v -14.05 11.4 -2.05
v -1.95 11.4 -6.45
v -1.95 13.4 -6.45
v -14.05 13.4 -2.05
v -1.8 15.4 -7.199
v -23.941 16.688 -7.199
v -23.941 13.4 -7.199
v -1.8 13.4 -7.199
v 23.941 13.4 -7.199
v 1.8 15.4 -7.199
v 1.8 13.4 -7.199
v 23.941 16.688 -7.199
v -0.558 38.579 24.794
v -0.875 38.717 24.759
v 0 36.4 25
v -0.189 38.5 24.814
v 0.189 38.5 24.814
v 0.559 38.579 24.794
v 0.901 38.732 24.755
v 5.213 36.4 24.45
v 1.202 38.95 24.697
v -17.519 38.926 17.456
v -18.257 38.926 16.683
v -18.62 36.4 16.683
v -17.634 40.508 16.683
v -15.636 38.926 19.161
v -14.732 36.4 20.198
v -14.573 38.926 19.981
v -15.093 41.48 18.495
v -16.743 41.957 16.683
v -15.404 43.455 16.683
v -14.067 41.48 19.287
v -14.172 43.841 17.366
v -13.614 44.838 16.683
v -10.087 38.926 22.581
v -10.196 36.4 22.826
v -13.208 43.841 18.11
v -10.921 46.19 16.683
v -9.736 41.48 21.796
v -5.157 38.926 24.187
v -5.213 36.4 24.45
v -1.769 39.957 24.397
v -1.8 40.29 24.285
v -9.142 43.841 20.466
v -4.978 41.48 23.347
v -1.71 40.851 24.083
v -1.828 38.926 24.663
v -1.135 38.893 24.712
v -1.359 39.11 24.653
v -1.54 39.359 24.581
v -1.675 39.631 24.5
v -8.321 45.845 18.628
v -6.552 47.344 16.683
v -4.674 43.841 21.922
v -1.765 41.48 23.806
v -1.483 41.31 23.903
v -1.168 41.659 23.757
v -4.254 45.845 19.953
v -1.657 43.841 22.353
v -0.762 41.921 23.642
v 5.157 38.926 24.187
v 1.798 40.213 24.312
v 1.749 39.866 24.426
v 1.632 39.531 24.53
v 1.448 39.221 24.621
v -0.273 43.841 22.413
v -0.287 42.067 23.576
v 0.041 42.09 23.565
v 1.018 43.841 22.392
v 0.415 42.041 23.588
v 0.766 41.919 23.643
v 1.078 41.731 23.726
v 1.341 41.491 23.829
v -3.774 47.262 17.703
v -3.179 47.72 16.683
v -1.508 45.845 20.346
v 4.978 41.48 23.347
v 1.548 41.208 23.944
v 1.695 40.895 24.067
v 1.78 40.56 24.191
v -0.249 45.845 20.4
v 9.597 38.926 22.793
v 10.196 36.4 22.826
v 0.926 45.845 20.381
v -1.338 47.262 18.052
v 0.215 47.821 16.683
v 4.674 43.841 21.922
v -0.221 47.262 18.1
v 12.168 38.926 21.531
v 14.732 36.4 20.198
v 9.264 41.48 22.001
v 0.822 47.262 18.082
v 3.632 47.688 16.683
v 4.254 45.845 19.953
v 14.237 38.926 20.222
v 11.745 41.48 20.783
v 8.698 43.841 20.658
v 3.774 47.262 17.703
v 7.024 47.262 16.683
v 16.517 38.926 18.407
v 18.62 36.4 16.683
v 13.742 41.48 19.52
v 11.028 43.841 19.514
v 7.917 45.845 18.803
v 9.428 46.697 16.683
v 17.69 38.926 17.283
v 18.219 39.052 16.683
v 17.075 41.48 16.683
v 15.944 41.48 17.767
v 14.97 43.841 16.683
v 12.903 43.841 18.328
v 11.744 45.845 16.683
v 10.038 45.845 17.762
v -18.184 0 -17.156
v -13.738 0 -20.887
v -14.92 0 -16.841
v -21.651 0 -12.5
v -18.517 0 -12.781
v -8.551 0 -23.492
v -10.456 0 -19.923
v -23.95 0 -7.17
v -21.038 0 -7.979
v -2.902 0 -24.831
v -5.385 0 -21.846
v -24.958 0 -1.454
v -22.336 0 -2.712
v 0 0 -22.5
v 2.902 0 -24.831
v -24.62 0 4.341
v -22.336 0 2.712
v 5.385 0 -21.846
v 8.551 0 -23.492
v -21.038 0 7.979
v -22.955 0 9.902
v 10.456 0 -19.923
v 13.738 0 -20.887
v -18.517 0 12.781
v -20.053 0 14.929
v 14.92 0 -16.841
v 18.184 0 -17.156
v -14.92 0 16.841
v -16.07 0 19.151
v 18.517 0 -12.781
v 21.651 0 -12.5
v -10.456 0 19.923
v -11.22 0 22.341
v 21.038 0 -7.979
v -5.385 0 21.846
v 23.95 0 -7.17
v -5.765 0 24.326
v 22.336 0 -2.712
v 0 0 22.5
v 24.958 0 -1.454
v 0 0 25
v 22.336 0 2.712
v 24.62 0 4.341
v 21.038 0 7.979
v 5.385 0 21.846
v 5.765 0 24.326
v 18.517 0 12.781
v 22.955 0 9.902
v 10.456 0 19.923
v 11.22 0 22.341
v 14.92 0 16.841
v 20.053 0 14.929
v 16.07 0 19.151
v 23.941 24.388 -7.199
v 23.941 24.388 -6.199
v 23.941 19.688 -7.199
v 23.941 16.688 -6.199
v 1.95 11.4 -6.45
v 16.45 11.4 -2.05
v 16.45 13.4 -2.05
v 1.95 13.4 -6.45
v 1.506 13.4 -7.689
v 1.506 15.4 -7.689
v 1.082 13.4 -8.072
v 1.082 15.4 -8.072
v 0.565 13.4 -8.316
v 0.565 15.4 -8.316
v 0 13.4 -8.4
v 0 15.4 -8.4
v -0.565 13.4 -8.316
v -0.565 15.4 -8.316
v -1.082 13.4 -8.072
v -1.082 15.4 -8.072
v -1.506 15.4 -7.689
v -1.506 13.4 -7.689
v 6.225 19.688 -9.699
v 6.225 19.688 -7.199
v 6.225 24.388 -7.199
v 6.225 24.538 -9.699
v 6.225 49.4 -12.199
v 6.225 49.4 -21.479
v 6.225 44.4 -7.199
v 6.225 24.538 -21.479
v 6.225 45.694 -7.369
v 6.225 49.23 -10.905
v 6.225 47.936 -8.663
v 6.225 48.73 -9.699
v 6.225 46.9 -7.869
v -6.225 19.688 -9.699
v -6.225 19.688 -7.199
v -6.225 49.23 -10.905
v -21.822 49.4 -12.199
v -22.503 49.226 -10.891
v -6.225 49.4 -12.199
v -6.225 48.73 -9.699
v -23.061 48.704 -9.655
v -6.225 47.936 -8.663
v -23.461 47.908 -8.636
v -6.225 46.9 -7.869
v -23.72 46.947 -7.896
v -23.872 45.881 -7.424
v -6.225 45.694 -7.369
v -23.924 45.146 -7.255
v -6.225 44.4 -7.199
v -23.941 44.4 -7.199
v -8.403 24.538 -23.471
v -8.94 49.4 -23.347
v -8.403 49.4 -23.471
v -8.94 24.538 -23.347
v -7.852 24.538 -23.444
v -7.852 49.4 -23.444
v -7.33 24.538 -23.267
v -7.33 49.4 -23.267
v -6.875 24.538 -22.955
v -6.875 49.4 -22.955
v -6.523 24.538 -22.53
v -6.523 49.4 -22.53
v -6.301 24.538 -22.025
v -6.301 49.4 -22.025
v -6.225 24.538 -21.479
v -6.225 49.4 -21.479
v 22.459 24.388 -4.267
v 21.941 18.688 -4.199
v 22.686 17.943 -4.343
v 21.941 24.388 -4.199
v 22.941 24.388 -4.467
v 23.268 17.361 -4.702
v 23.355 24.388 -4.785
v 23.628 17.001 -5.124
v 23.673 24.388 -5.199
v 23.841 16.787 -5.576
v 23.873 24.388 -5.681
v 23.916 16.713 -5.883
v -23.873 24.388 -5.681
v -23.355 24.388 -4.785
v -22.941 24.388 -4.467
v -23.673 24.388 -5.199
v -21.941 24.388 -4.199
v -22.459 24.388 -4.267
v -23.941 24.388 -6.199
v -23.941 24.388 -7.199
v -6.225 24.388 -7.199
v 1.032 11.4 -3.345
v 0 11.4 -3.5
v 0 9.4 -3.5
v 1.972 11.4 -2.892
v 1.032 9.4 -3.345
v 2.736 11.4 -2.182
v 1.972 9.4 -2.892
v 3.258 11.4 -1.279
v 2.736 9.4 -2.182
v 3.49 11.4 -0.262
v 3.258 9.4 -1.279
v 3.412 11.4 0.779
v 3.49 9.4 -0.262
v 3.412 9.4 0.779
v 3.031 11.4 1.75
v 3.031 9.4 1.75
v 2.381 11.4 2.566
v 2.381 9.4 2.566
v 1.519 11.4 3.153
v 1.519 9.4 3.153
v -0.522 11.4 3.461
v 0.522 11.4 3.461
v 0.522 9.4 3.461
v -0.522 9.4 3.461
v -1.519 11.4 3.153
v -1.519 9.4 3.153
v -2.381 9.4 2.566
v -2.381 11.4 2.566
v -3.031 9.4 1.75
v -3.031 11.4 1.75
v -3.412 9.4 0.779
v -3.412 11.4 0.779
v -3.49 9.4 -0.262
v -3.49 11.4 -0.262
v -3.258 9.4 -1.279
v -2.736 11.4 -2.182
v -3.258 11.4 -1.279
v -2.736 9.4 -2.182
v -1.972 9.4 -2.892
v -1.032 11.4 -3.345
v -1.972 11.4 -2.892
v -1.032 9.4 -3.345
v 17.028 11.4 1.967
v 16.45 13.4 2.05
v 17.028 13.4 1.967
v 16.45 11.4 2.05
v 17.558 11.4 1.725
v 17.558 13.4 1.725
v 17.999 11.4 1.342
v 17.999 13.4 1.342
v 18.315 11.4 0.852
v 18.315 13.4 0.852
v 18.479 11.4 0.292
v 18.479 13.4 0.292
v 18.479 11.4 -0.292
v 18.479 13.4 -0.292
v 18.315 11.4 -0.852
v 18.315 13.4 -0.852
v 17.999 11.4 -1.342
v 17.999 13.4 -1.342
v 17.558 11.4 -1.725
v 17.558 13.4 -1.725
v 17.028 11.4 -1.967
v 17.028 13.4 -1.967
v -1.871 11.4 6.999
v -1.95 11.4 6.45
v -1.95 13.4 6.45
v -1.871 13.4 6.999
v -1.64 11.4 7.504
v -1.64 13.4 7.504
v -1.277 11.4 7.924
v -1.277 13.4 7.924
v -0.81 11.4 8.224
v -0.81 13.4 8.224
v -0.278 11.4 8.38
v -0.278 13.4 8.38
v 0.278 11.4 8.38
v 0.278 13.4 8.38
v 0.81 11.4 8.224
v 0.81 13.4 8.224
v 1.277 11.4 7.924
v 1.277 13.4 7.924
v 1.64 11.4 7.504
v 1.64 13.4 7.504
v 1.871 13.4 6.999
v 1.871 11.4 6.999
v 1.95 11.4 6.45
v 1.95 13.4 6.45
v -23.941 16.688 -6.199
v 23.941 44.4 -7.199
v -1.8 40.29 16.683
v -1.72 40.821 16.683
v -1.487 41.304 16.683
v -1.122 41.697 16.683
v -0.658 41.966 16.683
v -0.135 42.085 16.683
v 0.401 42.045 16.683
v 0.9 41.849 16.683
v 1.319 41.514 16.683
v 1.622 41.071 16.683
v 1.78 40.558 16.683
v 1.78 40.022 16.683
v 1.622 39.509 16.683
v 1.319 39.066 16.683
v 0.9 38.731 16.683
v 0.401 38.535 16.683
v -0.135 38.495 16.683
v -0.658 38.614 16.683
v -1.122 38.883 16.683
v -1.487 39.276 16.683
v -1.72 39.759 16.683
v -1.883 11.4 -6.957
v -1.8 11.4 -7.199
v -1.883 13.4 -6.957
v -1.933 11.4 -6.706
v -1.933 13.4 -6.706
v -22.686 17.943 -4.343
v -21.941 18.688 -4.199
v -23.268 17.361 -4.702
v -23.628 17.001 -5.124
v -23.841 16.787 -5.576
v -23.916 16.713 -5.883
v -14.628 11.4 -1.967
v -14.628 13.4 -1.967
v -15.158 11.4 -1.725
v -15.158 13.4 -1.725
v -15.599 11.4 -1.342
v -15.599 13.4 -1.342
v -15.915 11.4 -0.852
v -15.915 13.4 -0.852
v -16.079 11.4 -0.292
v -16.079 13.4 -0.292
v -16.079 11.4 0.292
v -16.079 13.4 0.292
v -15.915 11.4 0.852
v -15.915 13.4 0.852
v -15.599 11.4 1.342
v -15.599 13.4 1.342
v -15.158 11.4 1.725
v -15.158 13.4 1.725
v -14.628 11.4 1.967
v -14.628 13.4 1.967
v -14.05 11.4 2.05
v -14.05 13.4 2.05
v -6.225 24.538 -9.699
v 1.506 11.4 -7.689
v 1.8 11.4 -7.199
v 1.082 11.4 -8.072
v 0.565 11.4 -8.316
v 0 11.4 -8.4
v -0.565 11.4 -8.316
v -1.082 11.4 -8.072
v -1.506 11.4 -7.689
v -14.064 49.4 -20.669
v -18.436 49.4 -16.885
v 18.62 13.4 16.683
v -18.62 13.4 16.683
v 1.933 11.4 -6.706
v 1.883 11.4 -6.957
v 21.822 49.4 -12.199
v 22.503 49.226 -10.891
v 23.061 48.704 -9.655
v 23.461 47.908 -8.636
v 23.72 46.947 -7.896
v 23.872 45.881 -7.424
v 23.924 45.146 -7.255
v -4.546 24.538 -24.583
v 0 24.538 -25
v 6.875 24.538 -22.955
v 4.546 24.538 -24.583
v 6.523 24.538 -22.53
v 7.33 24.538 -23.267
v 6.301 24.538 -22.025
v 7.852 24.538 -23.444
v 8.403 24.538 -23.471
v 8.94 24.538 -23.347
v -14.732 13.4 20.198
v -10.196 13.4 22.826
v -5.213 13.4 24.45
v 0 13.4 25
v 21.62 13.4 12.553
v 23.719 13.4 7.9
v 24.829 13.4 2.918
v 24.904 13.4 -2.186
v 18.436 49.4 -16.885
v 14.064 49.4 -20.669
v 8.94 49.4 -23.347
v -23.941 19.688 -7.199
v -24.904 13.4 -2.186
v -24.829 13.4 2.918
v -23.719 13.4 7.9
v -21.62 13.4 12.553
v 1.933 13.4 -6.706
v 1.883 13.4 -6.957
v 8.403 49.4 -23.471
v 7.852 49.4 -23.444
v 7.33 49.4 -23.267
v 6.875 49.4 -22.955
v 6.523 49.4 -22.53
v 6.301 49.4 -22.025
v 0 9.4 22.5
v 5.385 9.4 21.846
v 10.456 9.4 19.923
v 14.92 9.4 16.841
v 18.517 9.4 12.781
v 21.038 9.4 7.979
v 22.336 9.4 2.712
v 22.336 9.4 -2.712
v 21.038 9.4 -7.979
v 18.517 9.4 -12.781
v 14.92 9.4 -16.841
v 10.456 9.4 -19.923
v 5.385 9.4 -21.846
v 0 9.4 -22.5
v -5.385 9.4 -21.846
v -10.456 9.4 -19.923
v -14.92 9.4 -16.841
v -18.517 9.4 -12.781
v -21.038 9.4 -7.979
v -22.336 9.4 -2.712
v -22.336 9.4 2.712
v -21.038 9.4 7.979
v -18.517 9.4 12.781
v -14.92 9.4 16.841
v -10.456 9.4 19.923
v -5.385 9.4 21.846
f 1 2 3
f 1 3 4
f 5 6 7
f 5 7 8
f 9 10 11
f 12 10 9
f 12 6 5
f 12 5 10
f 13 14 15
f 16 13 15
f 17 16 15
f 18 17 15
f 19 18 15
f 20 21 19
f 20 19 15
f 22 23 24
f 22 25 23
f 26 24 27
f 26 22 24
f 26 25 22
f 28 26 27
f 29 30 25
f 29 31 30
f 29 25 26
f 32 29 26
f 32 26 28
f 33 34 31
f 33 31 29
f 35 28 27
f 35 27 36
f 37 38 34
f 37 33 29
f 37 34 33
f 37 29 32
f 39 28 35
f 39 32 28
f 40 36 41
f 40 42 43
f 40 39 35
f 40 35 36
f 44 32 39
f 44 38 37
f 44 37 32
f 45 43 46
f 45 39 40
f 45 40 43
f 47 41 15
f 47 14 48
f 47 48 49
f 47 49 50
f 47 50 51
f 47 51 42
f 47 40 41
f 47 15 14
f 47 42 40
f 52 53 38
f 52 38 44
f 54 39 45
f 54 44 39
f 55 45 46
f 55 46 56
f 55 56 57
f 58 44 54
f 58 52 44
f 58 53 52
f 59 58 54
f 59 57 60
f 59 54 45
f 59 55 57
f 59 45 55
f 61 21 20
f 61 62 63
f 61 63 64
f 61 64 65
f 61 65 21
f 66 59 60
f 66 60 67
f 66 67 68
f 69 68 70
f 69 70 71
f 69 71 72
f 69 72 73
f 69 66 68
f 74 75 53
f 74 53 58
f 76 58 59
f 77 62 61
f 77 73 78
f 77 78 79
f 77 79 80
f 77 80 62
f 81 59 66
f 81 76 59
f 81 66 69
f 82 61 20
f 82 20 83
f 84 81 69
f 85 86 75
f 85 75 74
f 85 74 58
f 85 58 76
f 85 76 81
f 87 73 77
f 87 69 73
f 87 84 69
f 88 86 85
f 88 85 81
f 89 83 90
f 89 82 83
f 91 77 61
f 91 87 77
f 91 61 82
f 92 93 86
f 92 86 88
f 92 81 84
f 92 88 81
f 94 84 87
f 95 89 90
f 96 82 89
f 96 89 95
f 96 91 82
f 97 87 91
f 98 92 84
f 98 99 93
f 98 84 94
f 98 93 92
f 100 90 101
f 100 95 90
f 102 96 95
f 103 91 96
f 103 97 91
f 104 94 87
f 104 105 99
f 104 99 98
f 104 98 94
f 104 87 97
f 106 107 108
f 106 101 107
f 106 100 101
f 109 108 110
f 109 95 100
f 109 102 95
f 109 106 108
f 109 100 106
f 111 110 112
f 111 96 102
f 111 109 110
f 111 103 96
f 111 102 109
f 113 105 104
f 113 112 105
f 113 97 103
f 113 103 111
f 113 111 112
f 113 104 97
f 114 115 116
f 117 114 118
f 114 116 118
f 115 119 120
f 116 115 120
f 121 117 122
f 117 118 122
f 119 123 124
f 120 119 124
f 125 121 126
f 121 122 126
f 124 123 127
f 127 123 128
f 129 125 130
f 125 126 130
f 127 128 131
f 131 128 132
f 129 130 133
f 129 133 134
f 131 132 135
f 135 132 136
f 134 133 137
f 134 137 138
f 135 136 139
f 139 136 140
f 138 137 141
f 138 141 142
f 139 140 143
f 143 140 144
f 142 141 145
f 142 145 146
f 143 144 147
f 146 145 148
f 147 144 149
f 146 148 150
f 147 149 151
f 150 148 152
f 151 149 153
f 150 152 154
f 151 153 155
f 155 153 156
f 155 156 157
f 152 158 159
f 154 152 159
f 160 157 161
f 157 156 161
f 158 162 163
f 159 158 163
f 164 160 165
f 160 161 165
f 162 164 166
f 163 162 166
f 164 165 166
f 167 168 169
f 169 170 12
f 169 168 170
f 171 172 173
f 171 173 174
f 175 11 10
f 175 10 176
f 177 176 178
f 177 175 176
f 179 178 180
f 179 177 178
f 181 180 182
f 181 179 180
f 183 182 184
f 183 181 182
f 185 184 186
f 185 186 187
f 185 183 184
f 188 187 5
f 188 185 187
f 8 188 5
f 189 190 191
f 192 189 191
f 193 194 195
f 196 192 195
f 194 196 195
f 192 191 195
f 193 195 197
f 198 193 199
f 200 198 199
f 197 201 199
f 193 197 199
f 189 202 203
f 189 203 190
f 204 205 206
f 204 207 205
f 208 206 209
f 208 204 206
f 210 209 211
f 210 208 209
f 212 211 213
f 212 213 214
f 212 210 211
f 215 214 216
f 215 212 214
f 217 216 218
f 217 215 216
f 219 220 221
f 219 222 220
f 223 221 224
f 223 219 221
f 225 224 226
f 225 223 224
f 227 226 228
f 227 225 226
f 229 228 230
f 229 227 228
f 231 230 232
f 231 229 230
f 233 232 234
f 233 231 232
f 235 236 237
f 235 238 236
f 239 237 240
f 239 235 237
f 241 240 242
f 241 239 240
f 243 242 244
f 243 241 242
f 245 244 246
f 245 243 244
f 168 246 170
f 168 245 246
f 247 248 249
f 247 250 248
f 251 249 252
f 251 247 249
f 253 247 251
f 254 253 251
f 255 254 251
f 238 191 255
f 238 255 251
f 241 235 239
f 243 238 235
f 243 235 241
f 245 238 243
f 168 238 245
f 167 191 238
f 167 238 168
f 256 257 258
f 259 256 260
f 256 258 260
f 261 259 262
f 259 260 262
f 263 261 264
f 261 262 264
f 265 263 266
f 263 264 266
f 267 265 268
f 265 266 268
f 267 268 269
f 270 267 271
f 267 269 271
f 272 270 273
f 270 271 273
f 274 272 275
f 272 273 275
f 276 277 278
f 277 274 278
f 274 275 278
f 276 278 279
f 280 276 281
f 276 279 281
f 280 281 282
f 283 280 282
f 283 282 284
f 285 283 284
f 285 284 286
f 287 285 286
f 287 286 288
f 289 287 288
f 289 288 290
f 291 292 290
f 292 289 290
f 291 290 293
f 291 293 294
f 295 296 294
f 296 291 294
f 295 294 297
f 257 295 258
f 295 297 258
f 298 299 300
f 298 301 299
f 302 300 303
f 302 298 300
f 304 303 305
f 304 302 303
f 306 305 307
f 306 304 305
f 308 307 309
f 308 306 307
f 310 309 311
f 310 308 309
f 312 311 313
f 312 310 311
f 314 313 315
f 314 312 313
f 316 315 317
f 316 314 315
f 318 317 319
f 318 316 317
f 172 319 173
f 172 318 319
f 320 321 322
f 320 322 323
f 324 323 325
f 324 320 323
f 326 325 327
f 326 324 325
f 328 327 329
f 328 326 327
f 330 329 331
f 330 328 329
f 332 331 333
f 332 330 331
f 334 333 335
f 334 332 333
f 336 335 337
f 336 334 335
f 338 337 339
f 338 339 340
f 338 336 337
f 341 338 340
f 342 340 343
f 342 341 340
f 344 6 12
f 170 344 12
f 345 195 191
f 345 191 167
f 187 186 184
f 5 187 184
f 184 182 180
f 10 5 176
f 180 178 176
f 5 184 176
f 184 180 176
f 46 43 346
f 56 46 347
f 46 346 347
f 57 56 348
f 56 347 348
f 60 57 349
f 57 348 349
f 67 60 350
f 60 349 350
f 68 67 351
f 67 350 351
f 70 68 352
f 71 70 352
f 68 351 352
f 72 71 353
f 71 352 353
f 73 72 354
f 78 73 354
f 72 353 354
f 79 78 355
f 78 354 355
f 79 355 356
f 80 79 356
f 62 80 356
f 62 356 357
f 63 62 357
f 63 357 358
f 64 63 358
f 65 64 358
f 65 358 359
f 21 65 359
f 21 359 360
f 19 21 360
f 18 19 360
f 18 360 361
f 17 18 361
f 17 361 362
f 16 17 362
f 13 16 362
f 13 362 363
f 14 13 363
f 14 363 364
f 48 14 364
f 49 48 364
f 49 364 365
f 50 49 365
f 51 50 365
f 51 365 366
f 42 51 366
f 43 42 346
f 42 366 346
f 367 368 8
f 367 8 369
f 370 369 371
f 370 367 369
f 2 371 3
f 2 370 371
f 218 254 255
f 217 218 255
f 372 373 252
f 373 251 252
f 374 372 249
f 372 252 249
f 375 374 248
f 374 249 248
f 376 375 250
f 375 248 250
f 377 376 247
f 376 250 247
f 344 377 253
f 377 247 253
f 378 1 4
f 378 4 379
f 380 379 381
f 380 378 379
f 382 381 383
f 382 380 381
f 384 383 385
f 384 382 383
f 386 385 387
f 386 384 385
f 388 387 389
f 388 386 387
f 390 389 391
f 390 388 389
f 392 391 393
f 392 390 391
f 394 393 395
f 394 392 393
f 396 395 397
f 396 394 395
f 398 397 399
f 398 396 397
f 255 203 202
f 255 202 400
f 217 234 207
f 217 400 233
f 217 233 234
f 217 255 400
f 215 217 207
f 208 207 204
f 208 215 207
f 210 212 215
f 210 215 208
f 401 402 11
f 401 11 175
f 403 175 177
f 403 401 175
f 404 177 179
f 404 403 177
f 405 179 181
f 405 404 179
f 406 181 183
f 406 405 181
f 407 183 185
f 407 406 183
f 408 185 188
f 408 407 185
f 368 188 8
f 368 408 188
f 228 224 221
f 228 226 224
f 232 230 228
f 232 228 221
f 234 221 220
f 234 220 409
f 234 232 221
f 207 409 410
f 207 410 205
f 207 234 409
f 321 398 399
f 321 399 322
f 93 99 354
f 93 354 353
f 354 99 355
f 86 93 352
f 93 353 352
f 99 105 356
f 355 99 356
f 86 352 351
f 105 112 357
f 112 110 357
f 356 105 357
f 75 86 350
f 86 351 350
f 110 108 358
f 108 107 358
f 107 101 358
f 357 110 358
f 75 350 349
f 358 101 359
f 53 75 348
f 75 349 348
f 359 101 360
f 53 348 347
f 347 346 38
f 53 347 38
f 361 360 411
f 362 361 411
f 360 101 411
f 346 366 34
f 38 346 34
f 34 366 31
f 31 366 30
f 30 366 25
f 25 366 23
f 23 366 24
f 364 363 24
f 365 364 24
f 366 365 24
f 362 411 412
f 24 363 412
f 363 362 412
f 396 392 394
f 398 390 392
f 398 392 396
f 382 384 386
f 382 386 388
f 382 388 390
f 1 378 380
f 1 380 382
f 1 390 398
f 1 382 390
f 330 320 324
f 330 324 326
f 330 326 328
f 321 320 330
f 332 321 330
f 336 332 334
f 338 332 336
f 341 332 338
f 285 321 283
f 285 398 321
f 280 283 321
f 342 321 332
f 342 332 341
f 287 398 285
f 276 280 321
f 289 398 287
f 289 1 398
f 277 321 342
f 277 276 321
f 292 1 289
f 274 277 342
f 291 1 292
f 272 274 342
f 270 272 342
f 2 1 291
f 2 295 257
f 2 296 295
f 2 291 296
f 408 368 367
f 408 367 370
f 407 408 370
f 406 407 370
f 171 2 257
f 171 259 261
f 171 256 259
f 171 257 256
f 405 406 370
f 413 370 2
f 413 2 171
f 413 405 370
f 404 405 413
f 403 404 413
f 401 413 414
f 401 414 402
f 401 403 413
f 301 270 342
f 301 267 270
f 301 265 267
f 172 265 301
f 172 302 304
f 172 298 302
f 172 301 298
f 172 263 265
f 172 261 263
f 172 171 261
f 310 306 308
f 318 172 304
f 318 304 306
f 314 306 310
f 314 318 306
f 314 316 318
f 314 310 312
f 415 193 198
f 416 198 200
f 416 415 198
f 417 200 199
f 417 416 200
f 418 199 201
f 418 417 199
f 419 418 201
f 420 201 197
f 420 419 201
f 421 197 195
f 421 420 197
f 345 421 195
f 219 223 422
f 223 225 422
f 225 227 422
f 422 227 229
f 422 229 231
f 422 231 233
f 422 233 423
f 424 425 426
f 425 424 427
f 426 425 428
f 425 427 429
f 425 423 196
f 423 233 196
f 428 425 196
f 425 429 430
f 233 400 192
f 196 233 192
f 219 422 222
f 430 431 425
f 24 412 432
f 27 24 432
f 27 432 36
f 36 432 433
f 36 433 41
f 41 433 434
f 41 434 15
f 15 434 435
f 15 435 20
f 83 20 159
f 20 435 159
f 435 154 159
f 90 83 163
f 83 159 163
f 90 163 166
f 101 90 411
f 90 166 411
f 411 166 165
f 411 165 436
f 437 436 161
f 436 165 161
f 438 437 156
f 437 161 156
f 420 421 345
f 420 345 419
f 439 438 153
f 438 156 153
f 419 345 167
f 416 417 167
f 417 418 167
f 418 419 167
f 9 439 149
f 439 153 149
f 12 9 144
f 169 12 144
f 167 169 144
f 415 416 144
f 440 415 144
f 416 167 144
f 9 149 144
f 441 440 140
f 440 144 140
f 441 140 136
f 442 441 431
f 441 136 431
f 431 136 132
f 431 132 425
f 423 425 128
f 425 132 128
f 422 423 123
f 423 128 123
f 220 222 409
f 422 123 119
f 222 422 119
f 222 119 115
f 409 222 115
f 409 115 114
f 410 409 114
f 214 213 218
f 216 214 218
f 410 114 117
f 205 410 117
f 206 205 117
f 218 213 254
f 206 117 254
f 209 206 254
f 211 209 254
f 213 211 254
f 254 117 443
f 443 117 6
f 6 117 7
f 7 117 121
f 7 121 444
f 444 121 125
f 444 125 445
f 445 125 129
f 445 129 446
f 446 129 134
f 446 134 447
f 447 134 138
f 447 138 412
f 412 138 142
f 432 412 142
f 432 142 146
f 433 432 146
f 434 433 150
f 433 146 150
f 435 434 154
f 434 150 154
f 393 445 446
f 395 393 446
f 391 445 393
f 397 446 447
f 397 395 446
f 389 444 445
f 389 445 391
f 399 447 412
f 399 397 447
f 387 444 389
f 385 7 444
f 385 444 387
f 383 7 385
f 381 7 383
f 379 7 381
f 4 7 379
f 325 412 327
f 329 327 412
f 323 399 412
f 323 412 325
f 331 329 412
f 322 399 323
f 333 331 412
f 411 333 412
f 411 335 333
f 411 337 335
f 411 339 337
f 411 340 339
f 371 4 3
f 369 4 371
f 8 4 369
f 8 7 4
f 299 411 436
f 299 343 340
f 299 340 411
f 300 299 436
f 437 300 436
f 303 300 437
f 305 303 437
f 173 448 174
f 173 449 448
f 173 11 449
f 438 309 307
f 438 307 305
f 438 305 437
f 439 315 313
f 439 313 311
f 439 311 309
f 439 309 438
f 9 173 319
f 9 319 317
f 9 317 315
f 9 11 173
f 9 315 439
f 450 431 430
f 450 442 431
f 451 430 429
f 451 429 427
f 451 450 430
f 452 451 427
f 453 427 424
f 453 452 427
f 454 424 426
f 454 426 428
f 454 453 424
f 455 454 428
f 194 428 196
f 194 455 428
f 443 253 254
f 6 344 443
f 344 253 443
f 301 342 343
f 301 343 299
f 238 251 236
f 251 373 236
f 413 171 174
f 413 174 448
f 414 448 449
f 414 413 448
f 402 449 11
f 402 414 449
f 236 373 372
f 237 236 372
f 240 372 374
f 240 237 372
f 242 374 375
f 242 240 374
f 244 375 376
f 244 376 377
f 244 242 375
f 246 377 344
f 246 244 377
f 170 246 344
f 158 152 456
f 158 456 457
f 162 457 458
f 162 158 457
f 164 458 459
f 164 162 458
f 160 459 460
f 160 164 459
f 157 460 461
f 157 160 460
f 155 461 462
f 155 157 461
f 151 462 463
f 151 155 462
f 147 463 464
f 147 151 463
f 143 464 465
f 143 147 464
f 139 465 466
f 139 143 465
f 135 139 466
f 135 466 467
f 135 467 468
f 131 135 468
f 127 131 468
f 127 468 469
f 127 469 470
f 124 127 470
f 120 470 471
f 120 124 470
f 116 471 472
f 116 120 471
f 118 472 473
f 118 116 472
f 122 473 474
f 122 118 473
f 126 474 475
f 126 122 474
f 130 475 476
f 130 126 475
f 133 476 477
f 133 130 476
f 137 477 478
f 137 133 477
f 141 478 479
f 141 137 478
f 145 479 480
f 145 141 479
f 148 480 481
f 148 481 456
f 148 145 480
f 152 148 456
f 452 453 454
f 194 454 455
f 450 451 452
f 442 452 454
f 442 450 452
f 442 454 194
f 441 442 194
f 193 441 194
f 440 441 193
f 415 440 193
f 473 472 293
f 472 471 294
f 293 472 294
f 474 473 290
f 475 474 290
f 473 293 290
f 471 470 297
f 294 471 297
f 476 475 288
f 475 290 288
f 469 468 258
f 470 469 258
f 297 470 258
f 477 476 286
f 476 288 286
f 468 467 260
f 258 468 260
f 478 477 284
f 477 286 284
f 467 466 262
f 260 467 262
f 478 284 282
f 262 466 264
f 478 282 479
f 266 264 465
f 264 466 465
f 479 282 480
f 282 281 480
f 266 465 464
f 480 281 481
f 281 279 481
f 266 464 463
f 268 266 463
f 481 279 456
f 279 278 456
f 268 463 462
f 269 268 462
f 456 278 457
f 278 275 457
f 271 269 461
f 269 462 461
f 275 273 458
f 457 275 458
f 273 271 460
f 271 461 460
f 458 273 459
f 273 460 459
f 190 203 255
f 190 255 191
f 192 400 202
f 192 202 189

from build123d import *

# Parameters (mm, degrees)
SKETCH1_R           = 25
SKETCH1_R_2         = 22.5
BOSS_EXTRUDE1_DEPTH = 9.4
SKETCH2_R           = 25
BOSS_EXTRUDE2_DEPTH = 40
SKETCH3_W           = 55.38055132
SKETCH3_H           = 33.998264421
CUT_EXTRUDE1_DEPTH  = 36
SKETCH4_R           = 3.5
CUT_EXTRUDE2_DEPTH  = 36
CUT_EXTRUDE3_START  = -2
SKETCH5_R           = 3.5
SKETCH5_R_2         = 2.05
SKETCH5_R_3         = 1.95
CUT_EXTRUDE3_DEPTH  = 2
SKETCH5_3_R         = 1.95
CUT_EXTRUDE4_DEPTH  = 2
SKETCH6_W           = 12.45
SKETCH6_H           = 22.55
CUT_EXTRUDE5_DEPTH  = 42
SKETCH6_4_W         = 12.45
SKETCH6_4_H         = 4.85
CUT_EXTRUDE6_DEPTH  = 2.5
SKETCH6_5_W         = 12.45
SKETCH6_5_H         = 2.312362619
CUT_EXTRUDE7_DEPTH  = 28.5
SKETCH7_W           = 47.88210926
SKETCH7_H           = 3
BOSS_EXTRUDE3_DEPTH = 3
SKETCH8_W           = 47.88210926
SKETCH8_H           = 3
BOSS_EXTRUDE4_DEPTH = 4.7
FILLET1_R           = 5
FILLET2_R           = 2
FILLET3_R           = 2
BOSS_EXTRUDE5_DEPTH = 35
FILLET4_R           = 12
SKETCH10_R          = 1.8
CUT_EXTRUDE8_DEPTH  = 36


with BuildPart() as part:
    # Sketch1 → Boss-Extrude1 (new body)
    with BuildSketch(Plane(origin=(0, 0, 0), x_dir=(1, 0, 0), z_dir=(0, 1, 0))):
        with Locations(Location((0, 0, 0), (0, 0, 270))):
            Circle(SKETCH1_R)
        with Locations(Location((0, 0, 0), (0, 0, 270))):
            Circle(SKETCH1_R_2, mode=Mode.SUBTRACT)
    extrude(amount=BOSS_EXTRUDE1_DEPTH)

    # Sketch2 → Boss-Extrude2 (add)
    with BuildSketch(Plane(origin=(0, 9.4, 0), x_dir=(1, 0, 0), z_dir=(0, 1, 0))):
        with Locations(Location((0, 0, 0), (0, 0, 270))):
            Circle(SKETCH2_R)
    extrude(amount=BOSS_EXTRUDE2_DEPTH)

    # Sketch3 → Cut-Extrude1 (cut)
    with BuildSketch(Plane(origin=(0, 49.4, 0), x_dir=(1, 0, 0), z_dir=(0, 1, 0))):
        with Locations((-2.69027566, -9.800111221)):
            Rectangle(SKETCH3_W, SKETCH3_H)
    extrude(amount=-CUT_EXTRUDE1_DEPTH, mode=Mode.SUBTRACT)

    # Sketch4 → Cut-Extrude2 (cut)
    with BuildSketch(Plane.XZ.offset(-9.4)):
        with Locations(Location((0, 0, 0), (0, 0, 270))):
            Circle(SKETCH4_R)
    extrude(amount=-CUT_EXTRUDE2_DEPTH, mode=Mode.SUBTRACT)

    # Sketch5 → Cut-Extrude3 (cut)
    # profile 1 of 6: a face of its own
    with BuildSketch(Plane(origin=(0, 13.4, 0), x_dir=(1, 0, 0), z_dir=(0, 1, 0)).offset(CUT_EXTRUDE3_START)):
        with BuildLine():
            Line((-1.95, 6.45), (-14.05, 2.05))
            ThreePointArc((-14.05, 2.05), (-12.600431099, 1.449568901), (-12, 0))
            ThreePointArc((-12, 0), (-12.600431099, -1.449568901), (-14.05, -2.05))
            Line((-14.05, -2.05), (-1.95, -6.45))
            ThreePointArc((-1.95, -6.45), (0, -4.5), (1.95, -6.45))
            Line((1.95, -6.45), (16.45, -2.05))
            ThreePointArc((16.45, -2.05), (14.4, 0), (16.45, 2.05))
            Line((16.45, 2.05), (1.95, 6.45))
            ThreePointArc((1.95, 6.45), (0, 4.5), (-1.95, 6.45))
        make_face()
        with Locations(Location((0, 0, 0), (0, 0, 90))):
            Circle(SKETCH5_R, mode=Mode.SUBTRACT)
    # profile 2 of 6: a face of its own
    with BuildSketch(Plane(origin=(0, 13.4, 0), x_dir=(1, 0, 0), z_dir=(0, 1, 0)).offset(CUT_EXTRUDE3_START)):
        with BuildLine():
            ThreePointArc((-1.800407609, 7.199020989), (-1.912236235, 6.831906509), (-1.95, 6.45))
            ThreePointArc((-1.95, 6.45), (0, 4.5), (1.95, 6.45))
            ThreePointArc((1.95, 6.45), (1.912236235, 6.831906509), (1.800407609, 7.199020989))
            Line((1.800407609, 7.199020989), (-1.800407609, 7.199020989))
        make_face()
    # profile 3 of 6: a face of its own
    with BuildSketch(Plane(origin=(0, 13.4, 0), x_dir=(1, 0, 0), z_dir=(0, 1, 0)).offset(CUT_EXTRUDE3_START)):
        with BuildLine():
            ThreePointArc((1.800407609, 7.199020989), (0, 8.4), (-1.800407609, 7.199020989))
            Line((-1.800407609, 7.199020989), (1.800407609, 7.199020989))
        make_face()
    # profile 4 of 6: a face of its own
    with BuildSketch(Plane(origin=(0, 13.4, 0), x_dir=(1, 0, 0), z_dir=(0, 1, 0)).offset(CUT_EXTRUDE3_START)):
        with Locations((-14.05, 0)):
            Circle(SKETCH5_R_2)
    # profile 5 of 6: a face of its own
    with BuildSketch(Plane(origin=(0, 13.4, 0), x_dir=(1, 0, 0), z_dir=(0, 1, 0)).offset(CUT_EXTRUDE3_START)):
        with Locations((16.45, 0)):
            Circle(SKETCH5_R_2)
    # profile 6 of 6: a face of its own
    with BuildSketch(Plane(origin=(0, 13.4, 0), x_dir=(1, 0, 0), z_dir=(0, 1, 0)).offset(CUT_EXTRUDE3_START)):
        with Locations((0, -6.45)):
            Circle(SKETCH5_R_3)
    extrude(amount=CUT_EXTRUDE3_DEPTH, mode=Mode.SUBTRACT)

    # Sketch5<3> → Cut-Extrude4 (cut)
    with BuildSketch(Plane(origin=(0, 13.4, 0), x_dir=(1, 0, 0), z_dir=(0, 1, 0))):
        with Locations((0, 6.45)):
            Circle(SKETCH5_3_R)
    extrude(amount=CUT_EXTRUDE4_DEPTH, mode=Mode.SUBTRACT)

    # Sketch6 → Cut-Extrude5 (cut)
    with BuildSketch(Plane.XY.offset(-7.199020989)):
        with Locations((0, 35.812637381)):
            Rectangle(SKETCH6_W, SKETCH6_H)
    extrude(amount=-CUT_EXTRUDE5_DEPTH, mode=Mode.SUBTRACT)

    # Sketch6<4> → Cut-Extrude6 (cut)
    with BuildSketch(Plane.XY.offset(-7.199020989)):
        with Locations((0, 22.112637381)):
            Rectangle(SKETCH6_4_W, SKETCH6_4_H)
    extrude(amount=-CUT_EXTRUDE6_DEPTH, mode=Mode.SUBTRACT)

    # Sketch6<5> → Cut-Extrude7 (cut)
    with BuildSketch(Plane.XY.offset(-7.199020989)):
        with Locations((0, 48.243818691)):
            Rectangle(SKETCH6_5_W, SKETCH6_5_H)
    extrude(amount=-CUT_EXTRUDE7_DEPTH, mode=Mode.SUBTRACT)

    # Sketch7 → Boss-Extrude3 (add)
    with BuildSketch(Plane.XY.offset(-7.199020989)):
        with Locations((0, 18.187637381)):
            Rectangle(SKETCH7_W, SKETCH7_H)
    extrude(amount=BOSS_EXTRUDE3_DEPTH)

    # Sketch8 → Boss-Extrude4 (add)
    with BuildSketch(Plane(origin=(0, 19.687637381, 0), x_dir=(1, 0, 0), z_dir=(0, 1, 0))):
        with Locations((0, 5.699020989)):
            Rectangle(SKETCH8_W, SKETCH8_H)
    extrude(amount=BOSS_EXTRUDE4_DEPTH)

    # Fillet1
    fillet1_edges = [part.edges().sort_by_distance(p)[0] for p in [
        (-15.083027315, 49.4, -7.199020989),
        (15.083027315, 49.4, -7.199020989),
    ]]
    fillet(fillet1_edges, radius=FILLET1_R)

    # Fillet2
    fillet2_edges = [part.edges().sort_by_distance(p)[0] for p in [
        (6.225, 36.96881869, -24.212587119),
        (-6.225, 36.96881869, -24.212587119),
    ]]
    fillet(fillet2_edges, radius=FILLET2_R)

    # Fillet3
    fillet3_edges = [part.edges().sort_by_distance(p)[0] for p in [
        (-23.94105463, 20.537637381, -4.199020989),
        (0, 16.687637381, -4.199020989),
        (23.94105463, 20.537637381, -4.199020989),
    ]]
    fillet(fillet3_edges, radius=FILLET3_R)

    # Sketch9 → Boss-Extrude5 (add)
    with BuildSketch(Plane(origin=(0, 13.4, 0), x_dir=(1, 0, 0), z_dir=(0, 1, 0))):
        with BuildLine():
            Line((18.619699915, -16.682529037), (-18.619699915, -16.682529037))
            ThreePointArc((-18.619699915, -16.682529037), (0, -25), (18.619699915, -16.682529037))
        make_face()
    extrude(amount=BOSS_EXTRUDE5_DEPTH)

    # Fillet4
    # the kernel refuses this fillet: 12 mm, written as the material it takes off along each edge
    with BuildSketch(Plane(origin=(0, 48.4, 0), x_dir=(-0.8915807568580754, 0, -0.4528617382826481), z_dir=(0.4528617382826481, 0, -0.8915807568580754))) as fillet4_piece_1_section:
        with BuildLine():
            CenterArc((25 - FILLET4_R, -FILLET4_R), FILLET4_R, 0, 90)
            Line((25 - FILLET4_R, 0), (25, 0))
            Line((25, 0), (25, -FILLET4_R))
        make_face()
    fillet4_piece_1 = revolve(axis=Axis((0, 48.4, 0), (0, 1, 0)), revolution_arc=233.854877773, mode=Mode.PRIVATE)
    fillet4_piece_1 = split(fillet4_piece_1, bisect_by=Plane(origin=(0, 43.523140853, 16.682529037), z_dir=(0, 0, 1)), keep=Keep.TOP, mode=Mode.PRIVATE)
    add(fillet4_piece_1, mode=Mode.SUBTRACT)

    # Sketch10 → Cut-Extrude8 (cut)
    with BuildSketch(Plane(origin=(0, 0, 16.682529037), x_dir=(-1, 0, 0), z_dir=(0, 0, -1))):
        with Locations((0, 40.29)):
            Circle(SKETCH10_R)
    extrude(amount=-CUT_EXTRUDE8_DEPTH, mode=Mode.SUBTRACT)


solid = part.part
